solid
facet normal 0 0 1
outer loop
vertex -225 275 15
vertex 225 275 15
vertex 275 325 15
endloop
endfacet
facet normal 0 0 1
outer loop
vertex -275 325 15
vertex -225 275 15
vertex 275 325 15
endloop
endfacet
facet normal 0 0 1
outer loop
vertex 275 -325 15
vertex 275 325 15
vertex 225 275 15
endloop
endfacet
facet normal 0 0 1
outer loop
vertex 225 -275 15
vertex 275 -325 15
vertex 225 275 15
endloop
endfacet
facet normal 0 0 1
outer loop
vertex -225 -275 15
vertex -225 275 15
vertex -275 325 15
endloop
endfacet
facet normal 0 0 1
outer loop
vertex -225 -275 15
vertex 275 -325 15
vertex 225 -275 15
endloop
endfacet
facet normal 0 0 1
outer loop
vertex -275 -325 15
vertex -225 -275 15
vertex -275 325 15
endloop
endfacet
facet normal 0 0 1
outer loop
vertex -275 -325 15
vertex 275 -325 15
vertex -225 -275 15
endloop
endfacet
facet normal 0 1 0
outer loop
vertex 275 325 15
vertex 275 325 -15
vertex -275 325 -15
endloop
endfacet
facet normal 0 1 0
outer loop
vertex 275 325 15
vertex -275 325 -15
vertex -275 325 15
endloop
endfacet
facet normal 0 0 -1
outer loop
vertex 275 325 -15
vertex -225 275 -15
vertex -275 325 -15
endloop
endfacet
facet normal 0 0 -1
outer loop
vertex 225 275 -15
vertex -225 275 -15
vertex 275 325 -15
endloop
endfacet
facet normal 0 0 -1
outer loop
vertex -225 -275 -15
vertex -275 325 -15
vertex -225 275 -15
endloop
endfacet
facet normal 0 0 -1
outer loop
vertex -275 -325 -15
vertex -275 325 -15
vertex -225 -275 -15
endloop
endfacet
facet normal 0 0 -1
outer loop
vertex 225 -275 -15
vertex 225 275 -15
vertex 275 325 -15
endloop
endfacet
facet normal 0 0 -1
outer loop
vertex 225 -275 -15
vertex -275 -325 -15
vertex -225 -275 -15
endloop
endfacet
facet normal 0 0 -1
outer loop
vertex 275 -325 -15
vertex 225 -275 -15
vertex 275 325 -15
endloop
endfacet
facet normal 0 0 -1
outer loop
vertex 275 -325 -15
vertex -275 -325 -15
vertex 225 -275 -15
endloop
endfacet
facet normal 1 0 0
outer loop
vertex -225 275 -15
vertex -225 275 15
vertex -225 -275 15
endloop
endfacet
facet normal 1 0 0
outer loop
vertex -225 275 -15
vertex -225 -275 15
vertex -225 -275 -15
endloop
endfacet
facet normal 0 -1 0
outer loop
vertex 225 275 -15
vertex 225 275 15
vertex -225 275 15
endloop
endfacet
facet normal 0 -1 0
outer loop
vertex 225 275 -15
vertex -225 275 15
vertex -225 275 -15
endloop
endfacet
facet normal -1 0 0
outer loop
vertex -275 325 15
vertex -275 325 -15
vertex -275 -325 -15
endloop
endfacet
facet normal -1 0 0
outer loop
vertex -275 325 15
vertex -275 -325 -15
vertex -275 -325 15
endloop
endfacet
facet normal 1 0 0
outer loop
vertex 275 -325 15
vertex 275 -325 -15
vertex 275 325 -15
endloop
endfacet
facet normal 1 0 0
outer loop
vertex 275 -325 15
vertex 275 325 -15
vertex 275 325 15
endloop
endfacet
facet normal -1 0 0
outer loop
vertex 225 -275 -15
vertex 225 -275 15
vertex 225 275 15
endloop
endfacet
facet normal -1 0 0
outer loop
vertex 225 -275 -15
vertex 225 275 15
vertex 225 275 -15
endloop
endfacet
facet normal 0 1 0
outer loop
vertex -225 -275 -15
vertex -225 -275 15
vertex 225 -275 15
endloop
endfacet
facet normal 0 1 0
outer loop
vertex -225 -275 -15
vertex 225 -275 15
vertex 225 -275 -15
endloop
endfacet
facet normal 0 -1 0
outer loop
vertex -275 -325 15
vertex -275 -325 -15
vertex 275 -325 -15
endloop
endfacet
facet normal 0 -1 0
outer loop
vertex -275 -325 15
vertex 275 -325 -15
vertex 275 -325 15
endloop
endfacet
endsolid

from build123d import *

# Parameters (mm, degrees)
F2_W = 50
F2_H = 30


with BuildPart() as f1:
    # F1: sweep along a path in F0
    with BuildLine(Plane.XY) as f1_path:
        Line((250, 300), (250, -300))
        Line((250, -300), (-250, -300))
        Line((-250, -300), (-250, 300))
        Line((-250, 300), (250, 300))
    # F2 (on Front) → F1 (sweep)
    with BuildSketch(Plane.XZ):
        with Locations((250, 0)):
            Rectangle(F2_W, F2_H)
    sweep(path=f1_path.line, transition=Transition.RIGHT)


solid = f1.part
